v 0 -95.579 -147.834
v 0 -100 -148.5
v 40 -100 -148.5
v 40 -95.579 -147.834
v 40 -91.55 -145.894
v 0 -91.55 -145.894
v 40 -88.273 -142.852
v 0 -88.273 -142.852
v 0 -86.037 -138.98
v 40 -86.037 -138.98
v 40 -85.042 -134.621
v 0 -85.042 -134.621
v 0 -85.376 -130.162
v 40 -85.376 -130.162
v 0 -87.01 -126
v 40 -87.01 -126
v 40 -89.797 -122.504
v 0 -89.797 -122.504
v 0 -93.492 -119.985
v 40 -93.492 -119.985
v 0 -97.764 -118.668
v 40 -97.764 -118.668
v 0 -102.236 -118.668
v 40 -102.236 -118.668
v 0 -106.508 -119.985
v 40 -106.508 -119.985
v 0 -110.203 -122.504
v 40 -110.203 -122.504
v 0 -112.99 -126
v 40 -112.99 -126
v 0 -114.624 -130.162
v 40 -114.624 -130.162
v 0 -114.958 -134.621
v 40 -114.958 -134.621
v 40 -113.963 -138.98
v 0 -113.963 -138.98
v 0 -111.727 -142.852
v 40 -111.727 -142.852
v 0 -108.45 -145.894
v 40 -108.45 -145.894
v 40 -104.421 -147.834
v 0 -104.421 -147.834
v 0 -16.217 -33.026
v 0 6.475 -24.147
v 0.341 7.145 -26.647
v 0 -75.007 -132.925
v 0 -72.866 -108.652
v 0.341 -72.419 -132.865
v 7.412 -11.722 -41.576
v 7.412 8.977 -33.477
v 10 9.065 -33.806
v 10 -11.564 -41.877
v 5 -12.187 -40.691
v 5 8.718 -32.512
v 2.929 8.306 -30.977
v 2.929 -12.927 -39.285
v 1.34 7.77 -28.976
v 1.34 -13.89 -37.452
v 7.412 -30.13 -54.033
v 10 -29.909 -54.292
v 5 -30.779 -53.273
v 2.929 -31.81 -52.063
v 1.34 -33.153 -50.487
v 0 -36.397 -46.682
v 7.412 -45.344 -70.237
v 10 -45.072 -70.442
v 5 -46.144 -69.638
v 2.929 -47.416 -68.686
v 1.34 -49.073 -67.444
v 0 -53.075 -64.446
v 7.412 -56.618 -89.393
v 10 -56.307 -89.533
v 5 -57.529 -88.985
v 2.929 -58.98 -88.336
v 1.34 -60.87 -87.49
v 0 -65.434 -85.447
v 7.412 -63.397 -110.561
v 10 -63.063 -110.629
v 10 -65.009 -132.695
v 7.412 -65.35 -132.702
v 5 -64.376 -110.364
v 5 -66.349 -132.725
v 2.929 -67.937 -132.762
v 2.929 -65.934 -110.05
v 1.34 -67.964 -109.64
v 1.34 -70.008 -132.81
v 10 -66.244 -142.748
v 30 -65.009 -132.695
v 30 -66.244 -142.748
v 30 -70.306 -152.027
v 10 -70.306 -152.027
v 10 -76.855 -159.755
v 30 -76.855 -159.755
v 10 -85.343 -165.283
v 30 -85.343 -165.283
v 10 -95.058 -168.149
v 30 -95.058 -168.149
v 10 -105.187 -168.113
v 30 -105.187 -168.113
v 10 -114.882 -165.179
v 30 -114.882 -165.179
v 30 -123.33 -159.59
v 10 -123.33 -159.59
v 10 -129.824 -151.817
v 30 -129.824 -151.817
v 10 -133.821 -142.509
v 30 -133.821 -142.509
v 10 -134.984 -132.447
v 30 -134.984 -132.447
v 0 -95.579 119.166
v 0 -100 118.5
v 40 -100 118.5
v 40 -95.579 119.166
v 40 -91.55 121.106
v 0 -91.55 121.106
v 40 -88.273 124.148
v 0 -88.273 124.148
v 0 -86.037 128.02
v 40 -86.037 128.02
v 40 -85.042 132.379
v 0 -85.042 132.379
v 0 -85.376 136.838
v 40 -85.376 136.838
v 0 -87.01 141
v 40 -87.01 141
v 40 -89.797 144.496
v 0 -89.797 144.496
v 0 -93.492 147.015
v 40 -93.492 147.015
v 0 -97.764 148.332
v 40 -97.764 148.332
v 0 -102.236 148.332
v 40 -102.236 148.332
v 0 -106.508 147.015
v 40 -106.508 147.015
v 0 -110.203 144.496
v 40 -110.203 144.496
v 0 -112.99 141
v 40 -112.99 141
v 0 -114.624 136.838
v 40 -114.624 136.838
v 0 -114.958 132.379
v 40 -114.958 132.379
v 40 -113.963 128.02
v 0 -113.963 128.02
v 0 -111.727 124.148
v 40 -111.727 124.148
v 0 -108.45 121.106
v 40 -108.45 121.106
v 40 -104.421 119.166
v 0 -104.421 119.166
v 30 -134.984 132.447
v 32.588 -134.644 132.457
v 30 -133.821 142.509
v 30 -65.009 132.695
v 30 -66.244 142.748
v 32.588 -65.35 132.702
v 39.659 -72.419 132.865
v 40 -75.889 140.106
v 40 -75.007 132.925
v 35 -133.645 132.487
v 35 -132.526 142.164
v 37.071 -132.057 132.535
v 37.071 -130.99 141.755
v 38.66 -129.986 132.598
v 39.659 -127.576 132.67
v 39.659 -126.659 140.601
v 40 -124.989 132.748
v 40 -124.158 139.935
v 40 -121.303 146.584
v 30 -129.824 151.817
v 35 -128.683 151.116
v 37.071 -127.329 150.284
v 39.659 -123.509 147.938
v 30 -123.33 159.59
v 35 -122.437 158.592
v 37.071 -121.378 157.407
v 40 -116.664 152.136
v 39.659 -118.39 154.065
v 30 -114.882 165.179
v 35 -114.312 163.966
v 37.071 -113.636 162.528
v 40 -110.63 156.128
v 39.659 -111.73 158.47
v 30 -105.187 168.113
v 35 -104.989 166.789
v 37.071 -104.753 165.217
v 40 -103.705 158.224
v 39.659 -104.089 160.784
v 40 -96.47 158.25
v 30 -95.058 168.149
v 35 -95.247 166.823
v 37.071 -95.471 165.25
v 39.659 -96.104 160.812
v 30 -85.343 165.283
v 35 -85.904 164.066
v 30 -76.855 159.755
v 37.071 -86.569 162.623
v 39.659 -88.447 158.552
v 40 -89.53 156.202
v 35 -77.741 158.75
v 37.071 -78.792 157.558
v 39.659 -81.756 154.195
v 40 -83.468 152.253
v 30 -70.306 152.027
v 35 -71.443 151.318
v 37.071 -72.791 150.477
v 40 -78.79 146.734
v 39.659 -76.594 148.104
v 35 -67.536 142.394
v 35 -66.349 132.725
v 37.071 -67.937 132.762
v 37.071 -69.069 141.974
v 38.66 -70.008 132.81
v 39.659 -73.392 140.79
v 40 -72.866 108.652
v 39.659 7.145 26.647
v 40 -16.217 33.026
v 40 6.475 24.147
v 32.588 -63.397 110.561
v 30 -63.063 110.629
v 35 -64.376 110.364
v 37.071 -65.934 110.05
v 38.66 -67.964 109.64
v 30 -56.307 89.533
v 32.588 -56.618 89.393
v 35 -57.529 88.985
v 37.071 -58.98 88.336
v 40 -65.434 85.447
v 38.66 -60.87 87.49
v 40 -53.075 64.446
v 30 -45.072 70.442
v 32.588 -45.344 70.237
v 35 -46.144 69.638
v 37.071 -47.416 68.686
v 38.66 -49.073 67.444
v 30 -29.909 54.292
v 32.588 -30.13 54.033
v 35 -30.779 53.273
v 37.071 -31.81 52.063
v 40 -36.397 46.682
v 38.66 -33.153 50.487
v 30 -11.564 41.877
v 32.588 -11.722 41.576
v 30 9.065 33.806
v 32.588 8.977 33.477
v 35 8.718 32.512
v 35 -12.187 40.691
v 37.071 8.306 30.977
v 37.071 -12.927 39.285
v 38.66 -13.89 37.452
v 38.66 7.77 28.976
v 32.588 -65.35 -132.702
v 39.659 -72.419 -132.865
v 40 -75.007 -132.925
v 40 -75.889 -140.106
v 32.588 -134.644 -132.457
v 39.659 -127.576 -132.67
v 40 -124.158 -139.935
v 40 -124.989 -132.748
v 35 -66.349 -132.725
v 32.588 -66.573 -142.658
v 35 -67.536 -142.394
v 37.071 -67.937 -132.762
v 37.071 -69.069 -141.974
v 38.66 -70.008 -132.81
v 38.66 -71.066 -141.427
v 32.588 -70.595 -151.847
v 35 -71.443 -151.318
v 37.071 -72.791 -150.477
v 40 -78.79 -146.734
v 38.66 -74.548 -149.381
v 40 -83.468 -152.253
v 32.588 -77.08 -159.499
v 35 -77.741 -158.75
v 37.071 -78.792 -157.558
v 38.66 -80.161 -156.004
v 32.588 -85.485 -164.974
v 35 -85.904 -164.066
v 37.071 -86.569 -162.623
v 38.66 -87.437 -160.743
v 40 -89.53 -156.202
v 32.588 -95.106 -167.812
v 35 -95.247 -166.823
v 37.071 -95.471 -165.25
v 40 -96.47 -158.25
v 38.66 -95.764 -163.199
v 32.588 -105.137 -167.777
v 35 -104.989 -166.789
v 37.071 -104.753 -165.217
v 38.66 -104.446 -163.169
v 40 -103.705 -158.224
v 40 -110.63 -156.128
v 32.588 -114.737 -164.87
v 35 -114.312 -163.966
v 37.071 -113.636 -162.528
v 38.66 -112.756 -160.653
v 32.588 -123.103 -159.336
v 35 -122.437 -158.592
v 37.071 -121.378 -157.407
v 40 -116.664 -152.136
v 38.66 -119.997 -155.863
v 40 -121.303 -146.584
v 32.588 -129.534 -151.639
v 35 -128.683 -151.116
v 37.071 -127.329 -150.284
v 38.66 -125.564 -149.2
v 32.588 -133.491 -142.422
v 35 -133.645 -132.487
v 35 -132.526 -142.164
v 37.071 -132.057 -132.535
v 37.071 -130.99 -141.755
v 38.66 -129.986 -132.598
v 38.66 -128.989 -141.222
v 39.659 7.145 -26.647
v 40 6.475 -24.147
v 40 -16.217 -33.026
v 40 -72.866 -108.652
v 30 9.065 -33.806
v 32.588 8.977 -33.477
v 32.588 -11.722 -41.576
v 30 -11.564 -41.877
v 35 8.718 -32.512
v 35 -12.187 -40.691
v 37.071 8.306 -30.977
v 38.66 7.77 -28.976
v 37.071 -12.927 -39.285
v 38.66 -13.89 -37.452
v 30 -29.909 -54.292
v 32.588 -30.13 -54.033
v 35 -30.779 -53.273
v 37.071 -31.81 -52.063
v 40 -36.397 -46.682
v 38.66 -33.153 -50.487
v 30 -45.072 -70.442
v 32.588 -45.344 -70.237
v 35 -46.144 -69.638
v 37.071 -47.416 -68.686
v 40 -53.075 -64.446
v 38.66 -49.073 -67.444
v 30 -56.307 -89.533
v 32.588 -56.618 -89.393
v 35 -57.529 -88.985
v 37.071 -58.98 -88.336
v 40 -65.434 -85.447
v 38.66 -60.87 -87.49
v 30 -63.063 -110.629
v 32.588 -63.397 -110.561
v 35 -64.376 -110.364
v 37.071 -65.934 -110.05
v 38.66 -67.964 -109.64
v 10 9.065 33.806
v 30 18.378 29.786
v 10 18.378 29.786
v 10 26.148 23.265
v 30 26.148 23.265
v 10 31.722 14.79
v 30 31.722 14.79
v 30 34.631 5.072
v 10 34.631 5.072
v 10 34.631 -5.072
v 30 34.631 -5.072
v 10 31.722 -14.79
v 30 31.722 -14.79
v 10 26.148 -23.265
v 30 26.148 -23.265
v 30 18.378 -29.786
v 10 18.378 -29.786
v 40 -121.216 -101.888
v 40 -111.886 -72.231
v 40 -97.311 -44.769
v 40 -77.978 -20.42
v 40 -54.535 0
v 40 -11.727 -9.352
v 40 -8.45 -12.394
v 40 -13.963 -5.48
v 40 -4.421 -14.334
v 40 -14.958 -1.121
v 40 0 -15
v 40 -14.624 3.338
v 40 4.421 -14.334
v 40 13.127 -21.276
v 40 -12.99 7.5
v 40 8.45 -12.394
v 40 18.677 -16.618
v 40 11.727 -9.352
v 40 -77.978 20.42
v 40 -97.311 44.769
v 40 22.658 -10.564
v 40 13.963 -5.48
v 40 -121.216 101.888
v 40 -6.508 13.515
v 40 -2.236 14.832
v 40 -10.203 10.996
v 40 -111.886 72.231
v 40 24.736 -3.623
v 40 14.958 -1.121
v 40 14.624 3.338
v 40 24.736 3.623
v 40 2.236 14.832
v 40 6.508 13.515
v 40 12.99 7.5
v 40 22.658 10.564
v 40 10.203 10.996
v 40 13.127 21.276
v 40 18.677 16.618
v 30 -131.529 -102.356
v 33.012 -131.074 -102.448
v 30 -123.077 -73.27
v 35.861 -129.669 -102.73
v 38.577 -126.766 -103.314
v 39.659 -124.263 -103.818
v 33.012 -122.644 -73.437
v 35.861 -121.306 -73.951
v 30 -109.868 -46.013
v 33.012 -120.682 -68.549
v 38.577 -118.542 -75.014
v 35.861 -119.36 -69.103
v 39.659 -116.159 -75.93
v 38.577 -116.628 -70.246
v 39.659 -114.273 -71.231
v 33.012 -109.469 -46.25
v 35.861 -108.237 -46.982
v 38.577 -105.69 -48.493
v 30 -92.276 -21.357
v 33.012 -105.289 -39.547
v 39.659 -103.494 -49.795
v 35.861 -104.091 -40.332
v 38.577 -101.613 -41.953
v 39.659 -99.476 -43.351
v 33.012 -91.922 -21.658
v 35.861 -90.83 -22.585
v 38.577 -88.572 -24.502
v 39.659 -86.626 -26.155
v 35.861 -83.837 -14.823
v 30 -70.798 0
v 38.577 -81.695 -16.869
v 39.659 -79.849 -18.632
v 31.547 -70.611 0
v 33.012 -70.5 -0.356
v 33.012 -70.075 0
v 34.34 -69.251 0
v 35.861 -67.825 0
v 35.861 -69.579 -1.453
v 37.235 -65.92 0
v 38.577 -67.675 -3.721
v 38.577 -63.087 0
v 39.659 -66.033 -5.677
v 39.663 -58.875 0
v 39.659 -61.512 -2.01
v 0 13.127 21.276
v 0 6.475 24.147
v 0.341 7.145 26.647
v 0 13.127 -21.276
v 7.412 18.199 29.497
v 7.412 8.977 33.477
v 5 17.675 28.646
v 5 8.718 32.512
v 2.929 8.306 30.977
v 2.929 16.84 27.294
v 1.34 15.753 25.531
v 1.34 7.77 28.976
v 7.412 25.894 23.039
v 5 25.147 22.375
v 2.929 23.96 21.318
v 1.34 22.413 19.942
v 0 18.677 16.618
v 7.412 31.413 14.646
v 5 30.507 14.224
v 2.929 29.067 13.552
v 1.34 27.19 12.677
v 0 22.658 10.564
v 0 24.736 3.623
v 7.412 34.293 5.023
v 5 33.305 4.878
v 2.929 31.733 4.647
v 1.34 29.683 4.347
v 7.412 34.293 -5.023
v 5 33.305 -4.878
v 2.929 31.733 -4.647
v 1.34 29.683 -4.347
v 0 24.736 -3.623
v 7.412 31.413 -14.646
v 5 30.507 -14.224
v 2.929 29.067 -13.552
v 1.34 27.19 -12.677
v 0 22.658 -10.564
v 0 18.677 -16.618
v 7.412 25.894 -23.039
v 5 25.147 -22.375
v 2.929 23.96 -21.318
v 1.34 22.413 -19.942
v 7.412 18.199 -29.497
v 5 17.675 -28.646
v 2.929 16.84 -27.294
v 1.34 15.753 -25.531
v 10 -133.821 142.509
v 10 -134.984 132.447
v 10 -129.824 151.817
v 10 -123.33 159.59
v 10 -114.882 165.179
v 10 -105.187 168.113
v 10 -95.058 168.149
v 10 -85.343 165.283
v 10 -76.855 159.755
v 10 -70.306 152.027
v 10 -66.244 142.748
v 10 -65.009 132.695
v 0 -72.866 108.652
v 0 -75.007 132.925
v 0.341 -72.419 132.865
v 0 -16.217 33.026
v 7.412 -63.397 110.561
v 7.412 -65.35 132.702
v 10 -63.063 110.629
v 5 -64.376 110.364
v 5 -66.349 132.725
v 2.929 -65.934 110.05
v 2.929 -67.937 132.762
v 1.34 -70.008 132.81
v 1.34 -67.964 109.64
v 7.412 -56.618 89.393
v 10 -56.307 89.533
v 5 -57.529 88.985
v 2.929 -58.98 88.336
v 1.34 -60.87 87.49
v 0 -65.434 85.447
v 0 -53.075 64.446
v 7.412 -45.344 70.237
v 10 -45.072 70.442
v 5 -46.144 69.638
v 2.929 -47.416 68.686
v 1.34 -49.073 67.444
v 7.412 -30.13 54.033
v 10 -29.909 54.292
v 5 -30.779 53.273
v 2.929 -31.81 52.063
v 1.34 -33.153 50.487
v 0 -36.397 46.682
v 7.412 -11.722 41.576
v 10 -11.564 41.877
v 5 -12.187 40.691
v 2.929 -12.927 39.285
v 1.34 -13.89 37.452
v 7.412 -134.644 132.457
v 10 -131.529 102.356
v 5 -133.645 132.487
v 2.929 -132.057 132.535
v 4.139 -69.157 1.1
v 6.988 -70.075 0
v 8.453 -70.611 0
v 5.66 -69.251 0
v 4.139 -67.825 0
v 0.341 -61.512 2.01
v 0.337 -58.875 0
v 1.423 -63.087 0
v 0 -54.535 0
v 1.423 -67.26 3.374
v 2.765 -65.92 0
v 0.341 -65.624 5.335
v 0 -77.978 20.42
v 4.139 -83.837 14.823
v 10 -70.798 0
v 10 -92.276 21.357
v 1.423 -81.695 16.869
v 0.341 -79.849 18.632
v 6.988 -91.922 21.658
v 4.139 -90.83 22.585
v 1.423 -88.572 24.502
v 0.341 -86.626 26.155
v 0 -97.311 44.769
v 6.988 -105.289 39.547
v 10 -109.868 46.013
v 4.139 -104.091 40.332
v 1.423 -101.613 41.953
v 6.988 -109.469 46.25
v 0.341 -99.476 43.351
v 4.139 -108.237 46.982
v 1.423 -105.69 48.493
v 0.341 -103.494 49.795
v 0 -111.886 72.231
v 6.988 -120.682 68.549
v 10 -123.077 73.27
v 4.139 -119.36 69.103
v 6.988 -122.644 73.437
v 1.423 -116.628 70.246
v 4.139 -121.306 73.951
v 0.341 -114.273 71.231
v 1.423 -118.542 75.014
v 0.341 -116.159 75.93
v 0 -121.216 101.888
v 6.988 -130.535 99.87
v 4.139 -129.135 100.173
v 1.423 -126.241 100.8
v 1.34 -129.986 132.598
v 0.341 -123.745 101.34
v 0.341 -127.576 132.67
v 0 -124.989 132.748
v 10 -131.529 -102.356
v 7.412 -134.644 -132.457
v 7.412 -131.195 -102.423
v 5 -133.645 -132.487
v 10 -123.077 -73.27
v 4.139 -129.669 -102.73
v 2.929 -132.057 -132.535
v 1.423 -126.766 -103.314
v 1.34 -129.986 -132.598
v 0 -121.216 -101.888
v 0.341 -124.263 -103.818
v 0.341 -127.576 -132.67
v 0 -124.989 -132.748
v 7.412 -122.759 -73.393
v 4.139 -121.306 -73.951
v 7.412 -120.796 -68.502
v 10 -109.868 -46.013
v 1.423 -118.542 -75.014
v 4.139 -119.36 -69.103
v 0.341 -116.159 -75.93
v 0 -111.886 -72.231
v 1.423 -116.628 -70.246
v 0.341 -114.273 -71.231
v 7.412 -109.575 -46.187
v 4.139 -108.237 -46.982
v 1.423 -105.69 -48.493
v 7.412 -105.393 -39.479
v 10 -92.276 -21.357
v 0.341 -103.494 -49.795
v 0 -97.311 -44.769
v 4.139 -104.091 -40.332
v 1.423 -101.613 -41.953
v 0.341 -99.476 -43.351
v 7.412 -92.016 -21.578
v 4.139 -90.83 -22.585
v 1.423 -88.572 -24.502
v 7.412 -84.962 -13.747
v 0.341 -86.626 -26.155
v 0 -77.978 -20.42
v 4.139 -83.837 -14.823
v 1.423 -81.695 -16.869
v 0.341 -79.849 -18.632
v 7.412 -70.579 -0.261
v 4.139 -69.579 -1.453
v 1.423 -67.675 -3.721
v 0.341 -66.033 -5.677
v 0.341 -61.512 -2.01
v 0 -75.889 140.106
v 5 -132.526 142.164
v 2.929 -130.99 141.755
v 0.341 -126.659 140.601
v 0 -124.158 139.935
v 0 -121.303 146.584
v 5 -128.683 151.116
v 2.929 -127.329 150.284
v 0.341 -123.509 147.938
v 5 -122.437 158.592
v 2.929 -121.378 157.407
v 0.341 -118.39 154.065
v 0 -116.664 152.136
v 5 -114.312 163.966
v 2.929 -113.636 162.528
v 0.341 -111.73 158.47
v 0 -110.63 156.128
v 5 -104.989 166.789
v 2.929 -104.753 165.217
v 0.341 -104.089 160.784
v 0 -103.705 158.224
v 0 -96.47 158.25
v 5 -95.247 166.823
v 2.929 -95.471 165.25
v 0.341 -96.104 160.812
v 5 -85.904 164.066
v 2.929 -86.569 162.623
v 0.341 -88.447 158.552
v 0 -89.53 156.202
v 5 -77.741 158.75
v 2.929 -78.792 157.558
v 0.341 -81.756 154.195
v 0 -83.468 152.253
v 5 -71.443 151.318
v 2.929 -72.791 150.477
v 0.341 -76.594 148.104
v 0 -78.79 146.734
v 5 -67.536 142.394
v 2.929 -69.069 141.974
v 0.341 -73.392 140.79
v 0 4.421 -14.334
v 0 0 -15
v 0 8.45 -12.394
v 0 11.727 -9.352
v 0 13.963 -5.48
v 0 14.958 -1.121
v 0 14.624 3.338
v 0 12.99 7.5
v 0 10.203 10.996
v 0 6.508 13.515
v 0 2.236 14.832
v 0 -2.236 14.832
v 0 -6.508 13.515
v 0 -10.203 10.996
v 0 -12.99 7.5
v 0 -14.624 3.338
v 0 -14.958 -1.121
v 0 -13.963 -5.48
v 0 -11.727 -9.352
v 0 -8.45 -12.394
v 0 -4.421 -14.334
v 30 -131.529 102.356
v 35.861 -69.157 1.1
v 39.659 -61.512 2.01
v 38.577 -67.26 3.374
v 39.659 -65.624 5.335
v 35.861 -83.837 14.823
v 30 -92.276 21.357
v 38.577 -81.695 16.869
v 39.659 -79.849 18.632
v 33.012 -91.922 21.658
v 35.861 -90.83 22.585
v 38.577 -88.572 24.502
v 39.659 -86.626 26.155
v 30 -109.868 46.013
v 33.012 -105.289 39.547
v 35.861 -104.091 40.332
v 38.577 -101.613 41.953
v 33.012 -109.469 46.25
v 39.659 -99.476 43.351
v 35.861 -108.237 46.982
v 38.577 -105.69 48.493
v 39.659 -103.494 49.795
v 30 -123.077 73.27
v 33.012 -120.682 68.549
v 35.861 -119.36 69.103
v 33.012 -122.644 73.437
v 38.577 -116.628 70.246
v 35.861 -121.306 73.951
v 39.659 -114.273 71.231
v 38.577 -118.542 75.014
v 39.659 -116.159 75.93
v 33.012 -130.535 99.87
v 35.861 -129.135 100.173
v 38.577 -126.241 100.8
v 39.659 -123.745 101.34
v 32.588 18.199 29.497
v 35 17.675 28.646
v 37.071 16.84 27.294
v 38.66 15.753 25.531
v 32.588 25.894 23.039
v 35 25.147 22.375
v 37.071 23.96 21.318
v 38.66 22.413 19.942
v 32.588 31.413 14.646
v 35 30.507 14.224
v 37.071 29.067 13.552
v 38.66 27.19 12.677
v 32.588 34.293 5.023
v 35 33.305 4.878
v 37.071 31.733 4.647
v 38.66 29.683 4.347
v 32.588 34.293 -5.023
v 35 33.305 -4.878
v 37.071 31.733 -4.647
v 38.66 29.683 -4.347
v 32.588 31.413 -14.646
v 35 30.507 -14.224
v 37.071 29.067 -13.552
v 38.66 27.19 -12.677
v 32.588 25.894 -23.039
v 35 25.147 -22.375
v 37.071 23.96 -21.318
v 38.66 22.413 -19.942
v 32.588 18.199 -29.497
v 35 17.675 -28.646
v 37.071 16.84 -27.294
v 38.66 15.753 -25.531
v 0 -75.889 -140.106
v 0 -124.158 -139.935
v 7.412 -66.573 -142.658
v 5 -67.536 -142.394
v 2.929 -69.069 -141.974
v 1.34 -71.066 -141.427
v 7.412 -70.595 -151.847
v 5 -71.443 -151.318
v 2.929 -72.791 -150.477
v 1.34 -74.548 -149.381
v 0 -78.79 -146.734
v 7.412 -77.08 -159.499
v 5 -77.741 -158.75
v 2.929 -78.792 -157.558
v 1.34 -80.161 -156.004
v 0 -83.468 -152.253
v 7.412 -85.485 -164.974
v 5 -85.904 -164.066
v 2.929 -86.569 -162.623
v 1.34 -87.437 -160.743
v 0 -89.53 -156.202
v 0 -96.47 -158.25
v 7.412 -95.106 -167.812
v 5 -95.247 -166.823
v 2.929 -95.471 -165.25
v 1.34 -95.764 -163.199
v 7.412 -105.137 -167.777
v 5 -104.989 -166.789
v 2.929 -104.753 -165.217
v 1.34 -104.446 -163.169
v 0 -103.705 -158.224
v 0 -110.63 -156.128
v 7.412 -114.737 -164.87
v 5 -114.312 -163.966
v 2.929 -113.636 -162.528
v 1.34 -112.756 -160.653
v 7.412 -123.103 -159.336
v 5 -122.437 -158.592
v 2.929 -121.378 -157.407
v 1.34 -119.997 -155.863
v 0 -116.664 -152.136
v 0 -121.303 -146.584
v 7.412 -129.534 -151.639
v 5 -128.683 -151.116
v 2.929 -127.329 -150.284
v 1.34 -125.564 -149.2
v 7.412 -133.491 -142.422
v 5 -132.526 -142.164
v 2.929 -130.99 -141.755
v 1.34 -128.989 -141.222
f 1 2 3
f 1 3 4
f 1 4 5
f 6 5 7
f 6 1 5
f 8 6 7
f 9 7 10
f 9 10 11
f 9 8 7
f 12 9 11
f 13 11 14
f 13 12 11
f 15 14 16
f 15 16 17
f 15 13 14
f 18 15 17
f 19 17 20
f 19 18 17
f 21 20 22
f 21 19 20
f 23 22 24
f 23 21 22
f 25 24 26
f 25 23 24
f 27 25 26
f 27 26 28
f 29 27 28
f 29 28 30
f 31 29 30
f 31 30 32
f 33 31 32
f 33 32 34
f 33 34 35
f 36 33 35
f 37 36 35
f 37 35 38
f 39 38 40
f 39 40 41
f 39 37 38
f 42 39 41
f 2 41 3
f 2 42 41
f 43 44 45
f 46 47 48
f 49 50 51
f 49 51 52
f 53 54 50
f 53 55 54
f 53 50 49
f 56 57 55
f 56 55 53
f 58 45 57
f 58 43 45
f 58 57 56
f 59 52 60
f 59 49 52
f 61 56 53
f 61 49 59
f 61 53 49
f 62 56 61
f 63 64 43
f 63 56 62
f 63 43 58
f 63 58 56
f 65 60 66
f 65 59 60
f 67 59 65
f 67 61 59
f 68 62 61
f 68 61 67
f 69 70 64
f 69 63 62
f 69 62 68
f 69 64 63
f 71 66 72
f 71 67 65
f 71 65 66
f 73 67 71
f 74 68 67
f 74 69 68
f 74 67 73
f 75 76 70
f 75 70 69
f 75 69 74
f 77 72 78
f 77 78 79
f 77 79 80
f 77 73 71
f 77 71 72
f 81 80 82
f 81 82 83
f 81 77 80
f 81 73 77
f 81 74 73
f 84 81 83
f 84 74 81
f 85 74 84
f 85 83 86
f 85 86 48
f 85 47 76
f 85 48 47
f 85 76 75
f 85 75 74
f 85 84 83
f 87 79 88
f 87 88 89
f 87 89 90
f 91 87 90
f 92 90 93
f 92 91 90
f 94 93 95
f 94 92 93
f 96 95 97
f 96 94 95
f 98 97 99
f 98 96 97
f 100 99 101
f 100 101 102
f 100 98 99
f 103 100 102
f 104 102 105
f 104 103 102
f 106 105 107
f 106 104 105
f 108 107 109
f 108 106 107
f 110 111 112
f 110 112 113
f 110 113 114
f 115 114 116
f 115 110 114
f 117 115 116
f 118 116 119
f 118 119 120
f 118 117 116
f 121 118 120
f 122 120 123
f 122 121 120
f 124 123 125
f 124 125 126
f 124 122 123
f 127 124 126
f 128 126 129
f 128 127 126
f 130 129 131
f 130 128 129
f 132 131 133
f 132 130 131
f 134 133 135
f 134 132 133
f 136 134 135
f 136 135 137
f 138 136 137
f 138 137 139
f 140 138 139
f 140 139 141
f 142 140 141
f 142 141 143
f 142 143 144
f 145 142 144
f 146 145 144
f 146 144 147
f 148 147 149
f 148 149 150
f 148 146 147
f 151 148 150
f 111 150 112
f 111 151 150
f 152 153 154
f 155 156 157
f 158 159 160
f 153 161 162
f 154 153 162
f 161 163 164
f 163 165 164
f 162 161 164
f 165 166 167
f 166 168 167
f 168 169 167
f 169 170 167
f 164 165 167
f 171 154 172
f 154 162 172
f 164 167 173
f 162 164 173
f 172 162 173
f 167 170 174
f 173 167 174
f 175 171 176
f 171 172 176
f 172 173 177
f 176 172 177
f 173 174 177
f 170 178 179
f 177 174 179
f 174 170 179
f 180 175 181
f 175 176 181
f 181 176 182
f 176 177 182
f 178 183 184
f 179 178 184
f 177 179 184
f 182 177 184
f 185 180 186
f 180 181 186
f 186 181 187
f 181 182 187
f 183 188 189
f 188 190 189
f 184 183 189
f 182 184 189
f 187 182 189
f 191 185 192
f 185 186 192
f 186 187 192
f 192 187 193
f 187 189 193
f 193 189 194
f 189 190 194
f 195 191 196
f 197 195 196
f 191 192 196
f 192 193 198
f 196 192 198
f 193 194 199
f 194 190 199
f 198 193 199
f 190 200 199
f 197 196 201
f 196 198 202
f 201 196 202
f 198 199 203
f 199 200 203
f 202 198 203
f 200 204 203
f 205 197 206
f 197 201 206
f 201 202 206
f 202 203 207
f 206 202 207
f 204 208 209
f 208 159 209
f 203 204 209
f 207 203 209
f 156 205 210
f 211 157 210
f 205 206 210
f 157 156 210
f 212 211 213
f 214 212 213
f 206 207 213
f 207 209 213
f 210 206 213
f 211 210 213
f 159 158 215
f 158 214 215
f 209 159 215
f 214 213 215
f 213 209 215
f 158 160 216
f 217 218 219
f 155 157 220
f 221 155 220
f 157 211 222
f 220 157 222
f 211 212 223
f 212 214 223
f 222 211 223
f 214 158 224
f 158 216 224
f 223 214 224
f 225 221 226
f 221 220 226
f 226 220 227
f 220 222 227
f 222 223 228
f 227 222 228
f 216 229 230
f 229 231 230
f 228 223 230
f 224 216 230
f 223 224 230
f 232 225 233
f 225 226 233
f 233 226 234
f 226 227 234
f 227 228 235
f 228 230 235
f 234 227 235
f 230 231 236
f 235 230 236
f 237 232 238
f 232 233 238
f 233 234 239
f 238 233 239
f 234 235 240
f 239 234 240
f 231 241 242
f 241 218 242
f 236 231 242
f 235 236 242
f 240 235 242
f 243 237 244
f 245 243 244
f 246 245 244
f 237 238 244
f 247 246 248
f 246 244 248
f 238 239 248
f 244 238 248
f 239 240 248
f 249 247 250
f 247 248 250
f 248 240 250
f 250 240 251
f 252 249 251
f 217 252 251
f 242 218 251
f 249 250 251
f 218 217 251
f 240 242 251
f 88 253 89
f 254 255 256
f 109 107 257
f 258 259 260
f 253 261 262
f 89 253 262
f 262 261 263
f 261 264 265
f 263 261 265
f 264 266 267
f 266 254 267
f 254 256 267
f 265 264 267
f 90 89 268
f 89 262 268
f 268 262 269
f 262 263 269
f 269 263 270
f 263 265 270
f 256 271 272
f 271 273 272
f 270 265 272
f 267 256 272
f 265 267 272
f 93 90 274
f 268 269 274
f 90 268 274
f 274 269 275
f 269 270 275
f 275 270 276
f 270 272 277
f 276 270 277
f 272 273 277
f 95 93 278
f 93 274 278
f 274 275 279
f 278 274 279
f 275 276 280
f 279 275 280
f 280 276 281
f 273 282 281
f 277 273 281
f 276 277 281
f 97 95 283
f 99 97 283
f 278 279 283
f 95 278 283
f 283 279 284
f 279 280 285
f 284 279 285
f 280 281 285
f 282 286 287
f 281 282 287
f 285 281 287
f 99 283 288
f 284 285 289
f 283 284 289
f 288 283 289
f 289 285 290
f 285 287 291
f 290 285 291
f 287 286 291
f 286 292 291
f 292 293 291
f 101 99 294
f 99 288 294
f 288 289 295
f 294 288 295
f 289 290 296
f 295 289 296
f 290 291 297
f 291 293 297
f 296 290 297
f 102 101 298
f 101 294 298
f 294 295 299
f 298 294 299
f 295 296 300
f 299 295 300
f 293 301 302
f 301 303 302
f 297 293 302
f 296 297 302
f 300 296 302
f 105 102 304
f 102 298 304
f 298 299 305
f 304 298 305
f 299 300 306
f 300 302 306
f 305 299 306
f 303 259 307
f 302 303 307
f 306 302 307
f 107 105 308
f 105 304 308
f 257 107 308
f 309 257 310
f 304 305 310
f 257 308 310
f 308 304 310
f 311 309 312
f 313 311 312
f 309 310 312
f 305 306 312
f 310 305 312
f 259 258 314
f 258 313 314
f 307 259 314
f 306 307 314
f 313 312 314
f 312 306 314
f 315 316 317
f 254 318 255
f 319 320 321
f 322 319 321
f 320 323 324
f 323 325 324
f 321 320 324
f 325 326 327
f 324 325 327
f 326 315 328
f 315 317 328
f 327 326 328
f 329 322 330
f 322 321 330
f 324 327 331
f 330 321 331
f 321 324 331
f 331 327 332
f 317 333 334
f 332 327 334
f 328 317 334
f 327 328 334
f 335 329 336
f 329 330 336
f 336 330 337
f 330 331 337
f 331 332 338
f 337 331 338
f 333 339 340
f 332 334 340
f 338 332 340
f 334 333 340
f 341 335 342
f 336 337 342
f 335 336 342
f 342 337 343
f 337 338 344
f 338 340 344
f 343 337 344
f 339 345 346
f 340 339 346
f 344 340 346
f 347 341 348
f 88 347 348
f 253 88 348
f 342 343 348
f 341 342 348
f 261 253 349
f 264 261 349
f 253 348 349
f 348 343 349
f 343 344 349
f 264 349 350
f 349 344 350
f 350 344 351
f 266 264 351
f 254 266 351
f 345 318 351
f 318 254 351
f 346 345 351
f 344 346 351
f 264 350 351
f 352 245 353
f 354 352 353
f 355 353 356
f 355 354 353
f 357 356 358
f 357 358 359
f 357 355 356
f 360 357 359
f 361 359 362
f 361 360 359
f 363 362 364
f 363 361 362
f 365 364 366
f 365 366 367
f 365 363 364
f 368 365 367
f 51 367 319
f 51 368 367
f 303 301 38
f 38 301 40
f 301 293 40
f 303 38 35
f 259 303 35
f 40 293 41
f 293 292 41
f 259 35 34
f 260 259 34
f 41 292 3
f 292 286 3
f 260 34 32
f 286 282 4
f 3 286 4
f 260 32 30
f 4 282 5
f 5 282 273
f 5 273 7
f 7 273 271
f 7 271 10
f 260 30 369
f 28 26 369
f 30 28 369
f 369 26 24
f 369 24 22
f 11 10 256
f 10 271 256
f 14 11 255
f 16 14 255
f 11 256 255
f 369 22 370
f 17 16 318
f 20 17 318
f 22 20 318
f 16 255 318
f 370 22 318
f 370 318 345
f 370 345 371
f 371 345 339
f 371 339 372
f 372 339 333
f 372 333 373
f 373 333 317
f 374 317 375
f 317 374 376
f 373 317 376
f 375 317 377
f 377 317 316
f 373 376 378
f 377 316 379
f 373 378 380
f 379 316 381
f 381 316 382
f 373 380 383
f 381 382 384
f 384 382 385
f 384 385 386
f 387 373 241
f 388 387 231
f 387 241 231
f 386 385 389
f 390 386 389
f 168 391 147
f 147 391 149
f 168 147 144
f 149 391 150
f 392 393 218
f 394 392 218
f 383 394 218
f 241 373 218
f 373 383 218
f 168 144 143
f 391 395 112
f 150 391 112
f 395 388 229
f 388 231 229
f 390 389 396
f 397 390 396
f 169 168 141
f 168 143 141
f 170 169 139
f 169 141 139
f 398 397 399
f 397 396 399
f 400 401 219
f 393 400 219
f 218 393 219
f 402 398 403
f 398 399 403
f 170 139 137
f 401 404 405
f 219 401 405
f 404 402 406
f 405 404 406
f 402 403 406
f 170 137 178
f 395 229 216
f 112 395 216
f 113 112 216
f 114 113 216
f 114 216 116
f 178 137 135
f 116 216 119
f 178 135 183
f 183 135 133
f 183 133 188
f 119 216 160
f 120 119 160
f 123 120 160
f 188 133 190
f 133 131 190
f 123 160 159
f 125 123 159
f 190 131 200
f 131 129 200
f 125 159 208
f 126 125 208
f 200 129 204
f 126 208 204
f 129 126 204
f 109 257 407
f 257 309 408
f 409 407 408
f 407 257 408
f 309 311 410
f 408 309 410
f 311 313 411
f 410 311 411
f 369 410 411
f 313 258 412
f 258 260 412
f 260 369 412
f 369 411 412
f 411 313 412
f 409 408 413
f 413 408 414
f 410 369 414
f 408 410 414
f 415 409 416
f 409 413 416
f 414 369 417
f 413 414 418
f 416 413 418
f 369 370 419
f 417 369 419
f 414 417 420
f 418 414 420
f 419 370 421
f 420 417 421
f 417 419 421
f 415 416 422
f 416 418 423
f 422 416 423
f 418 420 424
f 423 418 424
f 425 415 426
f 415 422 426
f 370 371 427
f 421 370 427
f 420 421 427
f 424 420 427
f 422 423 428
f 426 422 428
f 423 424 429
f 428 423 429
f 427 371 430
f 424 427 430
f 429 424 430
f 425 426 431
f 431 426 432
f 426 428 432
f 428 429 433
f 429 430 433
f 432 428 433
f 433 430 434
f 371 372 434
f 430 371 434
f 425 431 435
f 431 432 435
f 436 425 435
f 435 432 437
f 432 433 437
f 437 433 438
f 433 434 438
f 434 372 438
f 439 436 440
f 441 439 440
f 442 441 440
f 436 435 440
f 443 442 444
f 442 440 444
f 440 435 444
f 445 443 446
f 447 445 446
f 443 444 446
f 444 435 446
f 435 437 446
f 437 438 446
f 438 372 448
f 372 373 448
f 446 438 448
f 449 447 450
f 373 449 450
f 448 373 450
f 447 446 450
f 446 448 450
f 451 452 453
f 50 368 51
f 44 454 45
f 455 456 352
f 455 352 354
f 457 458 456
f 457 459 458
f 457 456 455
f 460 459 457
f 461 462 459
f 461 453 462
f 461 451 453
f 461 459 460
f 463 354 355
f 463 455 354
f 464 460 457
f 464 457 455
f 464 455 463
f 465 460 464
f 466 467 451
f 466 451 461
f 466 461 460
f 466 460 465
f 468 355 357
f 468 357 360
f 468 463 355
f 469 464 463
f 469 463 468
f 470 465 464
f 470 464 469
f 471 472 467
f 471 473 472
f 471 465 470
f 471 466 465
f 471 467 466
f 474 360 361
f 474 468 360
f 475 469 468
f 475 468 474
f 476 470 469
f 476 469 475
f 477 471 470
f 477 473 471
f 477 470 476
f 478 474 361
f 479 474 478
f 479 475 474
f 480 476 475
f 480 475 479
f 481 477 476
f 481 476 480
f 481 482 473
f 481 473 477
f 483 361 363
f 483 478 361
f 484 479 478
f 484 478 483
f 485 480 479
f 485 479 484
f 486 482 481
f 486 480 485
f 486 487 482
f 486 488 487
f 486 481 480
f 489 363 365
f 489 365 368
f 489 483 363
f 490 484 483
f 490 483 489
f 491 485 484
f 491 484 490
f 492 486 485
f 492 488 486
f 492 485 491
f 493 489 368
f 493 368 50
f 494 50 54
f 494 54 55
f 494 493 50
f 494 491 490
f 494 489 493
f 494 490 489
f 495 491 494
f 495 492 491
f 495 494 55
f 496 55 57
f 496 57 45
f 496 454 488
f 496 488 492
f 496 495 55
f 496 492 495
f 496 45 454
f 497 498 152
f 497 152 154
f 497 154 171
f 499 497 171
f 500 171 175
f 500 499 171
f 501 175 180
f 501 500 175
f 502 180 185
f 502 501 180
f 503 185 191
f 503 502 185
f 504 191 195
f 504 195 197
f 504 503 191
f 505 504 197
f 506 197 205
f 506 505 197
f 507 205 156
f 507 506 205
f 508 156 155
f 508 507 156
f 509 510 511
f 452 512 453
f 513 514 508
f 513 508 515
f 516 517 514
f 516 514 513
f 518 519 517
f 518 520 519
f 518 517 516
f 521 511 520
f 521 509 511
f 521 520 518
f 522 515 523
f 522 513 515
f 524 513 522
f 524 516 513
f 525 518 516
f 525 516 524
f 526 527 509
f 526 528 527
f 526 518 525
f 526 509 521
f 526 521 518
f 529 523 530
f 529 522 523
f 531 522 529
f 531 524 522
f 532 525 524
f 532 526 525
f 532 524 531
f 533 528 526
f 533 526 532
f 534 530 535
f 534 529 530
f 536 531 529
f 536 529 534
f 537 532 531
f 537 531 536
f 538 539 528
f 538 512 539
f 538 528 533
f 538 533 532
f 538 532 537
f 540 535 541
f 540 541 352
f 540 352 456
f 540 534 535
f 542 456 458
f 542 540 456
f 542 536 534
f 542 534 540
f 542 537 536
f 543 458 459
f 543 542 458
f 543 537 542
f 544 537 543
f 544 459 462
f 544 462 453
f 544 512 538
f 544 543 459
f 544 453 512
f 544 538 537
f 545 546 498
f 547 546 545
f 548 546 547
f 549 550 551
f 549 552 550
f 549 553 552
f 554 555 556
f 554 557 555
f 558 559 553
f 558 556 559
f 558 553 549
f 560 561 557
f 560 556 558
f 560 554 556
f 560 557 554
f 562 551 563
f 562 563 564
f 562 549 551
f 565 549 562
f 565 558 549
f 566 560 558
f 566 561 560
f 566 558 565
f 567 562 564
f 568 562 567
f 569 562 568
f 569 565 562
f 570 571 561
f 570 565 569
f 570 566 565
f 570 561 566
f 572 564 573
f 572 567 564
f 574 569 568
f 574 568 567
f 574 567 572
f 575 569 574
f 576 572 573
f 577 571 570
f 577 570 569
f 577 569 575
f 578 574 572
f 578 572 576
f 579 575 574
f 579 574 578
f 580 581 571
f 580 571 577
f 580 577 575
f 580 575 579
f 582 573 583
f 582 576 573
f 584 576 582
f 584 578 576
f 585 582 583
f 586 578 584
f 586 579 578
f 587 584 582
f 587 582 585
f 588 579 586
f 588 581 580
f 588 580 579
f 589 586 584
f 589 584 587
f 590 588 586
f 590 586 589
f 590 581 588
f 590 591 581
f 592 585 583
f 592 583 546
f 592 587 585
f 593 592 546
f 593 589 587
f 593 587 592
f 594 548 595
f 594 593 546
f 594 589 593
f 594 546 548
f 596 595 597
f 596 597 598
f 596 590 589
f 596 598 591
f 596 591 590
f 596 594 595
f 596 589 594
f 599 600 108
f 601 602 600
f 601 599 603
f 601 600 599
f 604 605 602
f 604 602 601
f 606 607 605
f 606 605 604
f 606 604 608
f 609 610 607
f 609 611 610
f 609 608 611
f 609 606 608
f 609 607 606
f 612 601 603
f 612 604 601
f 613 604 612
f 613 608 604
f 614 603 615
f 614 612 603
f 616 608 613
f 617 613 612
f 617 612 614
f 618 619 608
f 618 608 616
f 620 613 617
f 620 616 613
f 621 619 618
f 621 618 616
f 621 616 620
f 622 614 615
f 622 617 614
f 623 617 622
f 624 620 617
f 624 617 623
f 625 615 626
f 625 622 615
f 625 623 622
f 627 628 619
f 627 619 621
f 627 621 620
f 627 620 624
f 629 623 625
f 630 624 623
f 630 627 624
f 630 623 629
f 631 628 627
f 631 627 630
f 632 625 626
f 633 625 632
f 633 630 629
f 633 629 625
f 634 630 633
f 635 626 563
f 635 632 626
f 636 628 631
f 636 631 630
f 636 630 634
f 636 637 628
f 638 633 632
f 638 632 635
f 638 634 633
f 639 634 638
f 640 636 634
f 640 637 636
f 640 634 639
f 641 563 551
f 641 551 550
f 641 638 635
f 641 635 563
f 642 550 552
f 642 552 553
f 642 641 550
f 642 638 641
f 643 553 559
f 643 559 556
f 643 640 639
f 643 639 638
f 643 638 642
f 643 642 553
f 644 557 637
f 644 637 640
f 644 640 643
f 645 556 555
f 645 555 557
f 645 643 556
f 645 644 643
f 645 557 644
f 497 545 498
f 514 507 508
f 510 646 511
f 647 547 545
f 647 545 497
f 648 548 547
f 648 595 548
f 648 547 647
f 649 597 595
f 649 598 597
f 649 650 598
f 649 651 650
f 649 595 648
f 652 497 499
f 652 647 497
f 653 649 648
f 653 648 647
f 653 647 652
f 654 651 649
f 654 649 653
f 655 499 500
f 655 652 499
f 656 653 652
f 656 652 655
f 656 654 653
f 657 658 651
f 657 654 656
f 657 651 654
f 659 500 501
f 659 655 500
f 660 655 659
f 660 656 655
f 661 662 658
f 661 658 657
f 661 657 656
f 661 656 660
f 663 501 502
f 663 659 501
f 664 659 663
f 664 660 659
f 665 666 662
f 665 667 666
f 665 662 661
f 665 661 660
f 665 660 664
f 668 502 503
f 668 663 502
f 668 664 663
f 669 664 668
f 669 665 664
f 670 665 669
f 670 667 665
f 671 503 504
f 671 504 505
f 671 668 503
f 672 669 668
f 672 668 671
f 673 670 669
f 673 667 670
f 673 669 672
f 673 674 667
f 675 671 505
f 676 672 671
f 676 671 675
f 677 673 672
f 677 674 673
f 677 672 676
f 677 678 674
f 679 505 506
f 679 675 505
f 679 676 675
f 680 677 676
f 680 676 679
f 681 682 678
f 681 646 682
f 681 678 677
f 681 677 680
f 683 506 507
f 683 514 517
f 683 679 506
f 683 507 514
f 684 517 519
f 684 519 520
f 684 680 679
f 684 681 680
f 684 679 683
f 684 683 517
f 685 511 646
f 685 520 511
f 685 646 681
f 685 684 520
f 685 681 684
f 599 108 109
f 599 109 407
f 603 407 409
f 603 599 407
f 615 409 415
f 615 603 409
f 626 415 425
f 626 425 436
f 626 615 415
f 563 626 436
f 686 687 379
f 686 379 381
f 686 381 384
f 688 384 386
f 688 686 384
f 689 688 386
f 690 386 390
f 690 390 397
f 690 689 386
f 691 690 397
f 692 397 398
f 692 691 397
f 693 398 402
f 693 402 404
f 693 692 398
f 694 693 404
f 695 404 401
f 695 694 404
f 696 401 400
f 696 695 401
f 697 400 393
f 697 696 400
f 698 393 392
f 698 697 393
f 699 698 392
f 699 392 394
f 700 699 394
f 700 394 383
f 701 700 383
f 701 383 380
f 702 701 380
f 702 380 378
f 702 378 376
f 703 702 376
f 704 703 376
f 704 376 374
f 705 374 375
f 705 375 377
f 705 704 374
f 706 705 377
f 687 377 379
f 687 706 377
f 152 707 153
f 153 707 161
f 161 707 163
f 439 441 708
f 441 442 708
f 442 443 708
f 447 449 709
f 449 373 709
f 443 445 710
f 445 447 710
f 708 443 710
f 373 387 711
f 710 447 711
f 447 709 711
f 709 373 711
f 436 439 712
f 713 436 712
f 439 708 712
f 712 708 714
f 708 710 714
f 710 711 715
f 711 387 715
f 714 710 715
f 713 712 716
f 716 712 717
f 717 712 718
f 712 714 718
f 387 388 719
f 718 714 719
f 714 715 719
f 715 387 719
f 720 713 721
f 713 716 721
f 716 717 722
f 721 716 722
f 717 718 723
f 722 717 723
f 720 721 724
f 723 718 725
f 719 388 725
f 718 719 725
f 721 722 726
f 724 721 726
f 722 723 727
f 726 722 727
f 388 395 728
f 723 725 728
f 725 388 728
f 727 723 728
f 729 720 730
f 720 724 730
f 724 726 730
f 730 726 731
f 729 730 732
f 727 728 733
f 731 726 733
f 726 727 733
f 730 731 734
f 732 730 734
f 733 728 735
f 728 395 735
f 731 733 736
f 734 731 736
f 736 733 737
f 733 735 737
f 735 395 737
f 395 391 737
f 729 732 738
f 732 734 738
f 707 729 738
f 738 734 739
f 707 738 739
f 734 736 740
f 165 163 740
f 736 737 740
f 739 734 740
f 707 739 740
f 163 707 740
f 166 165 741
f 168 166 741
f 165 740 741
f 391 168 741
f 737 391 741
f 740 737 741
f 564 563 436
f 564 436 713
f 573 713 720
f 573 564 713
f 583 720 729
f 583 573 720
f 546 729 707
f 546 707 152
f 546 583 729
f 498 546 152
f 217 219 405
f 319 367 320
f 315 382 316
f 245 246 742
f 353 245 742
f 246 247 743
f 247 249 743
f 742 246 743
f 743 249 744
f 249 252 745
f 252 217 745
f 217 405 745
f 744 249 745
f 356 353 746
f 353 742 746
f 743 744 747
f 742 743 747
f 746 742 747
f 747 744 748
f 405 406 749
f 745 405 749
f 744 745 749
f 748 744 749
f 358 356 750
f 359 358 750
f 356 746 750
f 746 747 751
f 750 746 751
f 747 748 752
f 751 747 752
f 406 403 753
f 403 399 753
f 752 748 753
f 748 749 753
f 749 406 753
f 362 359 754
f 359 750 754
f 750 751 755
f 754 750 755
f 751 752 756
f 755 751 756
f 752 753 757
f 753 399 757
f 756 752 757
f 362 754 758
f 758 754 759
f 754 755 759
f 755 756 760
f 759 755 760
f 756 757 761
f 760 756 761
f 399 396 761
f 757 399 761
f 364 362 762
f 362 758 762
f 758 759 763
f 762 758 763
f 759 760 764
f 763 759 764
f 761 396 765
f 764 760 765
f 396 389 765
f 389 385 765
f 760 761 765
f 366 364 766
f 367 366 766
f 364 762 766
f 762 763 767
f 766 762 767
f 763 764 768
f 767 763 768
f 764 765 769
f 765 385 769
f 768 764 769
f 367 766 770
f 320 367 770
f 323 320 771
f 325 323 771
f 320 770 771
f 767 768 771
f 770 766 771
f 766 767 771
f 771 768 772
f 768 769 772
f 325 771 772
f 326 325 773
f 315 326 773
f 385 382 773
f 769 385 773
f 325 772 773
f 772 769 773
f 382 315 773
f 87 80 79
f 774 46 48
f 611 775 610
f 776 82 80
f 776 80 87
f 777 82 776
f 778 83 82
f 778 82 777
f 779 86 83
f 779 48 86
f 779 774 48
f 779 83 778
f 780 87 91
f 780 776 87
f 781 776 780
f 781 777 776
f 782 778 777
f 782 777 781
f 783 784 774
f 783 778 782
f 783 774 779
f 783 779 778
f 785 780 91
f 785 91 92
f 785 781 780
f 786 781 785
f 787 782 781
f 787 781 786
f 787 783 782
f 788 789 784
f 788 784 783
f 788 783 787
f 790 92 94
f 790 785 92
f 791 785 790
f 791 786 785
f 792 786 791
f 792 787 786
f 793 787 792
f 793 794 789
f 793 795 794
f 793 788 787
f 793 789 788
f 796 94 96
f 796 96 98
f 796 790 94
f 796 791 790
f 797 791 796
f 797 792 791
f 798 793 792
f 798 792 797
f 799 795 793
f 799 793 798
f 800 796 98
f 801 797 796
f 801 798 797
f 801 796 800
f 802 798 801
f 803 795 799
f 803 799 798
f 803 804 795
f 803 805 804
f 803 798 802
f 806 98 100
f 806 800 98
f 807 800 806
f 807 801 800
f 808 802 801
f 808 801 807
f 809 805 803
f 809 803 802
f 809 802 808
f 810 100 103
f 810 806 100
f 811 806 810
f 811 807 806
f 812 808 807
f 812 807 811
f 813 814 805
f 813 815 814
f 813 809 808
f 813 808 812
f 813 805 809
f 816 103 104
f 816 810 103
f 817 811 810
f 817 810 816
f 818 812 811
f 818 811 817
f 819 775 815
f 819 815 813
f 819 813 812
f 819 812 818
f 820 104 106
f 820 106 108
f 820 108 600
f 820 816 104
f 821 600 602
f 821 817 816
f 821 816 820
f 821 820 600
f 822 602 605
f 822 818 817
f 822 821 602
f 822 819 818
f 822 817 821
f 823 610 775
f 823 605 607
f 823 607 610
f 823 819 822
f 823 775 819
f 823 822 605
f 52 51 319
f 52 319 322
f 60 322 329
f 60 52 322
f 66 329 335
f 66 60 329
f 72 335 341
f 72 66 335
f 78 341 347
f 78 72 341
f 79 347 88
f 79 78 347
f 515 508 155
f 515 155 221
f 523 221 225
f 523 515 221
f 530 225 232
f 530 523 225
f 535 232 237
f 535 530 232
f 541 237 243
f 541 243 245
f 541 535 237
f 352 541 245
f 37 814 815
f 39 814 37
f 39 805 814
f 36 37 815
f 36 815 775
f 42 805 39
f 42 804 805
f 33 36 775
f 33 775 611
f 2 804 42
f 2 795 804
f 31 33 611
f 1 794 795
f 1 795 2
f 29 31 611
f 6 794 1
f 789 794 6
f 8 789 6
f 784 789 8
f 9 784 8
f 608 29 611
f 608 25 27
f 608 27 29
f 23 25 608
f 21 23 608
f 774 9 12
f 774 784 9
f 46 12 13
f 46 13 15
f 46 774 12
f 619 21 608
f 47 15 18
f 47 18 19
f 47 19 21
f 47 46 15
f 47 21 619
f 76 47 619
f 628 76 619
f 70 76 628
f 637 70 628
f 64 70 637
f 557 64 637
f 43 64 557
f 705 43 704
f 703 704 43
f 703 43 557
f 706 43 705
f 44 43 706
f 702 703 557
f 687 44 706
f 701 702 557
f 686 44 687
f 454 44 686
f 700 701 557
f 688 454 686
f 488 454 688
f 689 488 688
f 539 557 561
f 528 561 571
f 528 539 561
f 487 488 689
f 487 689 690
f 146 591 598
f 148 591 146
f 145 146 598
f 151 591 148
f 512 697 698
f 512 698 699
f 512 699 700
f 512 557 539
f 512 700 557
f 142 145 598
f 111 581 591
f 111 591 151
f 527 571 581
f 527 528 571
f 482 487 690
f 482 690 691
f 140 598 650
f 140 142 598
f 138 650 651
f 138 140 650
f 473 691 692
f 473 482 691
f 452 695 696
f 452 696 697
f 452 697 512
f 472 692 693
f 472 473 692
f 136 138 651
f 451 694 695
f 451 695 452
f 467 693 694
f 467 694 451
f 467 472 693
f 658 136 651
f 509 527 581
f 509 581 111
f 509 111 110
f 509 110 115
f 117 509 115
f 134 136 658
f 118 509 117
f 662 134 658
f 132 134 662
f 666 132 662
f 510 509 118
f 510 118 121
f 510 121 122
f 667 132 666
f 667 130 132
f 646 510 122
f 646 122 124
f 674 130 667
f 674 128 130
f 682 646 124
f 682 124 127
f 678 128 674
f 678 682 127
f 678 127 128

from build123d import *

# Parameters (mm, degrees)
SKETCH1_R           = 15
BOSS_EXTRUDE1_DEPTH = 40
FILLET1_R           = 10


with BuildPart() as part:
    # Sketch1 → Boss-Extrude1 (new body)
    with BuildSketch(Plane(origin=(0, 0, 0), x_dir=(0, 0, -1), z_dir=(1, 0, 0))):
        with BuildLine():
            ThreePointArc((132.694646831, -65.009266851), (168.499781041, -100.12380247), (132.447129149, -134.984160172))
            ThreePointArc((132.447129149, -134.984160172), (59.3634858, -117.047102518), (0, -70.79849696))
            ThreePointArc((0, -70.79849696), (-59.3634858, -117.047102518), (-132.447129149, -134.984160172))
            ThreePointArc((-132.447129149, -134.984160172), (-168.499781041, -100.12380247), (-132.694646831, -65.009266851))
            ThreePointArc((-132.694646831, -65.009266851), (-70.44161018, -45.071700409), (-33.805757942, 9.064807223))
            ThreePointArc((-33.805757942, 9.064807223), (0, 35), (33.805757942, 9.064807223))
            ThreePointArc((33.805757942, 9.064807223), (70.44161018, -45.071700409), (132.694646831, -65.009266851))
        make_face()
        Circle(SKETCH1_R, mode=Mode.SUBTRACT)
        with Locations((-133.5, -100)):
            Circle(SKETCH1_R, mode=Mode.SUBTRACT)
        with Locations((133.5, -100)):
            Circle(SKETCH1_R, mode=Mode.SUBTRACT)
    extrude(amount=BOSS_EXTRUDE1_DEPTH)

    # Fillet1
    fillet1_edges = [part.edges().sort_by_distance(p)[0] for p in [
        (0, -117.047102518, -59.3634858),
        (0, -117.047102518, 59.3634858),
        (0, -100.12380247, 168.499781041),
        (0, -45.071700409, 70.44161018),
        (0, 35, 0),
        (0, -45.071700409, -70.44161018),
        (0, -100.12380247, -168.499781041),
        (40, -100.12380247, -168.499781041),
        (40, -45.071700409, -70.44161018),
        (40, 35, 0),
        (40, -45.071700409, 70.44161018),
        (40, -100.12380247, 168.499781041),
        (40, -117.047102518, 59.3634858),
        (40, -117.047102518, -59.3634858),
    ]]
    fillet(fillet1_edges, radius=FILLET1_R)


solid = part.part
